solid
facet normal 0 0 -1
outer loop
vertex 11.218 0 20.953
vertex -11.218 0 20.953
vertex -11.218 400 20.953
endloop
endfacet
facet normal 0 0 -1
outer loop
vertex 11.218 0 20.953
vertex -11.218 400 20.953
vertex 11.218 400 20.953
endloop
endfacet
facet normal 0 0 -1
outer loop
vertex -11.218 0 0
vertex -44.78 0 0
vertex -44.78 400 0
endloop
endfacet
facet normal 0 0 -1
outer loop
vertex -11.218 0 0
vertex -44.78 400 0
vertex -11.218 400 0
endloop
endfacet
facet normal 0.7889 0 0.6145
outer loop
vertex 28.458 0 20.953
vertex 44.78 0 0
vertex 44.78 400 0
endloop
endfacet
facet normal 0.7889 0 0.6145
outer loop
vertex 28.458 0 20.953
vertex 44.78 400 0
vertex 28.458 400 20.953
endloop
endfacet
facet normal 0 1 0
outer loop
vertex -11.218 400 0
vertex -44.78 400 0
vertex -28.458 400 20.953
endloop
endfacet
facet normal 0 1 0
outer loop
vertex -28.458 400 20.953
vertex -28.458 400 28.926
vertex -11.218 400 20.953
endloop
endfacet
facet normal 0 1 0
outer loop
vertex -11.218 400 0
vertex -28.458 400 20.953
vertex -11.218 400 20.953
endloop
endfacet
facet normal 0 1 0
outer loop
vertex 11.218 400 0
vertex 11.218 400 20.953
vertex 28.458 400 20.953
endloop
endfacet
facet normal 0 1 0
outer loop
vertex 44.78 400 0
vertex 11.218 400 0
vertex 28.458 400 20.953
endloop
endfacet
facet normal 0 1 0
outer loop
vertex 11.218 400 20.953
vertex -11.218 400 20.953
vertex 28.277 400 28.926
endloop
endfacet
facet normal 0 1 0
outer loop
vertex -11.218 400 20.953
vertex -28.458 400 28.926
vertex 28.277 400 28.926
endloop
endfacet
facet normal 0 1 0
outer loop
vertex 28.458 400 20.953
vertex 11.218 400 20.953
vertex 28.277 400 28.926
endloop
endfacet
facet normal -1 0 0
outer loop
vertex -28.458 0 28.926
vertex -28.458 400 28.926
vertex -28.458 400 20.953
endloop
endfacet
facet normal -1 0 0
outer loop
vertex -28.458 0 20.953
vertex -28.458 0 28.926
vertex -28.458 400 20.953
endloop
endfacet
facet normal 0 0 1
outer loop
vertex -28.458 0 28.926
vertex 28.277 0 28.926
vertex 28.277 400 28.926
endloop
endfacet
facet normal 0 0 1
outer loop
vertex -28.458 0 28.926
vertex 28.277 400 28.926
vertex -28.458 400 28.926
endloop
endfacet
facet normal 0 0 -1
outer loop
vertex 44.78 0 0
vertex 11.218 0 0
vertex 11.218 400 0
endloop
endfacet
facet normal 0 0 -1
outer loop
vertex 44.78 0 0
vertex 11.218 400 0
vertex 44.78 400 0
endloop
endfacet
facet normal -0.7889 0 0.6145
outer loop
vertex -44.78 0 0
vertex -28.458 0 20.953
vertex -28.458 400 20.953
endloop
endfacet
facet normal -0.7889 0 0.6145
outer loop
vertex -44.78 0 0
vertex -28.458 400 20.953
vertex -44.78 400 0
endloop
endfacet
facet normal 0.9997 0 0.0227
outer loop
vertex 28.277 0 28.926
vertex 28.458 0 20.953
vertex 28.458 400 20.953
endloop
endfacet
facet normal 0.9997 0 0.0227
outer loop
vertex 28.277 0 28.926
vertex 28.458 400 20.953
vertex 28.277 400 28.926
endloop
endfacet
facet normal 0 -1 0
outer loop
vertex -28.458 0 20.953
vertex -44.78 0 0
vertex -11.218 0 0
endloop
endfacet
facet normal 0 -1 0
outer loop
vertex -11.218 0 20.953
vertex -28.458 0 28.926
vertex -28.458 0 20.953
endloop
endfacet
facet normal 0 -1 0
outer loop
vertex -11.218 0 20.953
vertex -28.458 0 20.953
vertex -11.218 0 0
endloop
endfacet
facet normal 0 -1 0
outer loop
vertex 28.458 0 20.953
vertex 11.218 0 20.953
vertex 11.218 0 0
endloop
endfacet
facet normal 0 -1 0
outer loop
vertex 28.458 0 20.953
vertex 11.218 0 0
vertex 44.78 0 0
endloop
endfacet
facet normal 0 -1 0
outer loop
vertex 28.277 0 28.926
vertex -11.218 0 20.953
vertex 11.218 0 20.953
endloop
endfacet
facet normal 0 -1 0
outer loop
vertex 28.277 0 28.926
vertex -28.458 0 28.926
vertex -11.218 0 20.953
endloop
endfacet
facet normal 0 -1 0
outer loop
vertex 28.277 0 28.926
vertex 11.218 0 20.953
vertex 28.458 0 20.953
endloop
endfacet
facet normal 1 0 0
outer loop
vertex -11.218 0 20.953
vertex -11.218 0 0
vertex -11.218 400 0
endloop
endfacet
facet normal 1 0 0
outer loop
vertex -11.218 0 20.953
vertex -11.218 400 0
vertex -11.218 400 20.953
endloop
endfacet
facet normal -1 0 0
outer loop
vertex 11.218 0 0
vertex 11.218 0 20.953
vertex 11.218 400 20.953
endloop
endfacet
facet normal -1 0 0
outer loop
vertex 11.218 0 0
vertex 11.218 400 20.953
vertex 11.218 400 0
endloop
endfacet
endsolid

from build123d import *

# Parameters (mm, degrees)
F1_DEPTH = 400


# Not quite as in the source:
# - a feature names something its author has since deleted; it is built from what else it names


with BuildPart() as f1:
    # F0 (on Front) → F1 (new body)
    with BuildSketch(Plane.XZ):
        Polygon((11.218088679, 20.9527928382), (11.218088679, 0), (28.4624192864, 0), (44.7796396911, 0), (28.4582051874, 20.9527928382), (28.2770004123, 28.9259795099), (-28.4582051874, 28.9259795099), (-28.4582051874, 20.9527928382), (-44.7796396911, 0), (-28.4624192864, 0), (-11.218088679, 0), (-11.218088679, 20.9527928382), align=None)
    extrude(amount=-F1_DEPTH)


solid = f1.part
